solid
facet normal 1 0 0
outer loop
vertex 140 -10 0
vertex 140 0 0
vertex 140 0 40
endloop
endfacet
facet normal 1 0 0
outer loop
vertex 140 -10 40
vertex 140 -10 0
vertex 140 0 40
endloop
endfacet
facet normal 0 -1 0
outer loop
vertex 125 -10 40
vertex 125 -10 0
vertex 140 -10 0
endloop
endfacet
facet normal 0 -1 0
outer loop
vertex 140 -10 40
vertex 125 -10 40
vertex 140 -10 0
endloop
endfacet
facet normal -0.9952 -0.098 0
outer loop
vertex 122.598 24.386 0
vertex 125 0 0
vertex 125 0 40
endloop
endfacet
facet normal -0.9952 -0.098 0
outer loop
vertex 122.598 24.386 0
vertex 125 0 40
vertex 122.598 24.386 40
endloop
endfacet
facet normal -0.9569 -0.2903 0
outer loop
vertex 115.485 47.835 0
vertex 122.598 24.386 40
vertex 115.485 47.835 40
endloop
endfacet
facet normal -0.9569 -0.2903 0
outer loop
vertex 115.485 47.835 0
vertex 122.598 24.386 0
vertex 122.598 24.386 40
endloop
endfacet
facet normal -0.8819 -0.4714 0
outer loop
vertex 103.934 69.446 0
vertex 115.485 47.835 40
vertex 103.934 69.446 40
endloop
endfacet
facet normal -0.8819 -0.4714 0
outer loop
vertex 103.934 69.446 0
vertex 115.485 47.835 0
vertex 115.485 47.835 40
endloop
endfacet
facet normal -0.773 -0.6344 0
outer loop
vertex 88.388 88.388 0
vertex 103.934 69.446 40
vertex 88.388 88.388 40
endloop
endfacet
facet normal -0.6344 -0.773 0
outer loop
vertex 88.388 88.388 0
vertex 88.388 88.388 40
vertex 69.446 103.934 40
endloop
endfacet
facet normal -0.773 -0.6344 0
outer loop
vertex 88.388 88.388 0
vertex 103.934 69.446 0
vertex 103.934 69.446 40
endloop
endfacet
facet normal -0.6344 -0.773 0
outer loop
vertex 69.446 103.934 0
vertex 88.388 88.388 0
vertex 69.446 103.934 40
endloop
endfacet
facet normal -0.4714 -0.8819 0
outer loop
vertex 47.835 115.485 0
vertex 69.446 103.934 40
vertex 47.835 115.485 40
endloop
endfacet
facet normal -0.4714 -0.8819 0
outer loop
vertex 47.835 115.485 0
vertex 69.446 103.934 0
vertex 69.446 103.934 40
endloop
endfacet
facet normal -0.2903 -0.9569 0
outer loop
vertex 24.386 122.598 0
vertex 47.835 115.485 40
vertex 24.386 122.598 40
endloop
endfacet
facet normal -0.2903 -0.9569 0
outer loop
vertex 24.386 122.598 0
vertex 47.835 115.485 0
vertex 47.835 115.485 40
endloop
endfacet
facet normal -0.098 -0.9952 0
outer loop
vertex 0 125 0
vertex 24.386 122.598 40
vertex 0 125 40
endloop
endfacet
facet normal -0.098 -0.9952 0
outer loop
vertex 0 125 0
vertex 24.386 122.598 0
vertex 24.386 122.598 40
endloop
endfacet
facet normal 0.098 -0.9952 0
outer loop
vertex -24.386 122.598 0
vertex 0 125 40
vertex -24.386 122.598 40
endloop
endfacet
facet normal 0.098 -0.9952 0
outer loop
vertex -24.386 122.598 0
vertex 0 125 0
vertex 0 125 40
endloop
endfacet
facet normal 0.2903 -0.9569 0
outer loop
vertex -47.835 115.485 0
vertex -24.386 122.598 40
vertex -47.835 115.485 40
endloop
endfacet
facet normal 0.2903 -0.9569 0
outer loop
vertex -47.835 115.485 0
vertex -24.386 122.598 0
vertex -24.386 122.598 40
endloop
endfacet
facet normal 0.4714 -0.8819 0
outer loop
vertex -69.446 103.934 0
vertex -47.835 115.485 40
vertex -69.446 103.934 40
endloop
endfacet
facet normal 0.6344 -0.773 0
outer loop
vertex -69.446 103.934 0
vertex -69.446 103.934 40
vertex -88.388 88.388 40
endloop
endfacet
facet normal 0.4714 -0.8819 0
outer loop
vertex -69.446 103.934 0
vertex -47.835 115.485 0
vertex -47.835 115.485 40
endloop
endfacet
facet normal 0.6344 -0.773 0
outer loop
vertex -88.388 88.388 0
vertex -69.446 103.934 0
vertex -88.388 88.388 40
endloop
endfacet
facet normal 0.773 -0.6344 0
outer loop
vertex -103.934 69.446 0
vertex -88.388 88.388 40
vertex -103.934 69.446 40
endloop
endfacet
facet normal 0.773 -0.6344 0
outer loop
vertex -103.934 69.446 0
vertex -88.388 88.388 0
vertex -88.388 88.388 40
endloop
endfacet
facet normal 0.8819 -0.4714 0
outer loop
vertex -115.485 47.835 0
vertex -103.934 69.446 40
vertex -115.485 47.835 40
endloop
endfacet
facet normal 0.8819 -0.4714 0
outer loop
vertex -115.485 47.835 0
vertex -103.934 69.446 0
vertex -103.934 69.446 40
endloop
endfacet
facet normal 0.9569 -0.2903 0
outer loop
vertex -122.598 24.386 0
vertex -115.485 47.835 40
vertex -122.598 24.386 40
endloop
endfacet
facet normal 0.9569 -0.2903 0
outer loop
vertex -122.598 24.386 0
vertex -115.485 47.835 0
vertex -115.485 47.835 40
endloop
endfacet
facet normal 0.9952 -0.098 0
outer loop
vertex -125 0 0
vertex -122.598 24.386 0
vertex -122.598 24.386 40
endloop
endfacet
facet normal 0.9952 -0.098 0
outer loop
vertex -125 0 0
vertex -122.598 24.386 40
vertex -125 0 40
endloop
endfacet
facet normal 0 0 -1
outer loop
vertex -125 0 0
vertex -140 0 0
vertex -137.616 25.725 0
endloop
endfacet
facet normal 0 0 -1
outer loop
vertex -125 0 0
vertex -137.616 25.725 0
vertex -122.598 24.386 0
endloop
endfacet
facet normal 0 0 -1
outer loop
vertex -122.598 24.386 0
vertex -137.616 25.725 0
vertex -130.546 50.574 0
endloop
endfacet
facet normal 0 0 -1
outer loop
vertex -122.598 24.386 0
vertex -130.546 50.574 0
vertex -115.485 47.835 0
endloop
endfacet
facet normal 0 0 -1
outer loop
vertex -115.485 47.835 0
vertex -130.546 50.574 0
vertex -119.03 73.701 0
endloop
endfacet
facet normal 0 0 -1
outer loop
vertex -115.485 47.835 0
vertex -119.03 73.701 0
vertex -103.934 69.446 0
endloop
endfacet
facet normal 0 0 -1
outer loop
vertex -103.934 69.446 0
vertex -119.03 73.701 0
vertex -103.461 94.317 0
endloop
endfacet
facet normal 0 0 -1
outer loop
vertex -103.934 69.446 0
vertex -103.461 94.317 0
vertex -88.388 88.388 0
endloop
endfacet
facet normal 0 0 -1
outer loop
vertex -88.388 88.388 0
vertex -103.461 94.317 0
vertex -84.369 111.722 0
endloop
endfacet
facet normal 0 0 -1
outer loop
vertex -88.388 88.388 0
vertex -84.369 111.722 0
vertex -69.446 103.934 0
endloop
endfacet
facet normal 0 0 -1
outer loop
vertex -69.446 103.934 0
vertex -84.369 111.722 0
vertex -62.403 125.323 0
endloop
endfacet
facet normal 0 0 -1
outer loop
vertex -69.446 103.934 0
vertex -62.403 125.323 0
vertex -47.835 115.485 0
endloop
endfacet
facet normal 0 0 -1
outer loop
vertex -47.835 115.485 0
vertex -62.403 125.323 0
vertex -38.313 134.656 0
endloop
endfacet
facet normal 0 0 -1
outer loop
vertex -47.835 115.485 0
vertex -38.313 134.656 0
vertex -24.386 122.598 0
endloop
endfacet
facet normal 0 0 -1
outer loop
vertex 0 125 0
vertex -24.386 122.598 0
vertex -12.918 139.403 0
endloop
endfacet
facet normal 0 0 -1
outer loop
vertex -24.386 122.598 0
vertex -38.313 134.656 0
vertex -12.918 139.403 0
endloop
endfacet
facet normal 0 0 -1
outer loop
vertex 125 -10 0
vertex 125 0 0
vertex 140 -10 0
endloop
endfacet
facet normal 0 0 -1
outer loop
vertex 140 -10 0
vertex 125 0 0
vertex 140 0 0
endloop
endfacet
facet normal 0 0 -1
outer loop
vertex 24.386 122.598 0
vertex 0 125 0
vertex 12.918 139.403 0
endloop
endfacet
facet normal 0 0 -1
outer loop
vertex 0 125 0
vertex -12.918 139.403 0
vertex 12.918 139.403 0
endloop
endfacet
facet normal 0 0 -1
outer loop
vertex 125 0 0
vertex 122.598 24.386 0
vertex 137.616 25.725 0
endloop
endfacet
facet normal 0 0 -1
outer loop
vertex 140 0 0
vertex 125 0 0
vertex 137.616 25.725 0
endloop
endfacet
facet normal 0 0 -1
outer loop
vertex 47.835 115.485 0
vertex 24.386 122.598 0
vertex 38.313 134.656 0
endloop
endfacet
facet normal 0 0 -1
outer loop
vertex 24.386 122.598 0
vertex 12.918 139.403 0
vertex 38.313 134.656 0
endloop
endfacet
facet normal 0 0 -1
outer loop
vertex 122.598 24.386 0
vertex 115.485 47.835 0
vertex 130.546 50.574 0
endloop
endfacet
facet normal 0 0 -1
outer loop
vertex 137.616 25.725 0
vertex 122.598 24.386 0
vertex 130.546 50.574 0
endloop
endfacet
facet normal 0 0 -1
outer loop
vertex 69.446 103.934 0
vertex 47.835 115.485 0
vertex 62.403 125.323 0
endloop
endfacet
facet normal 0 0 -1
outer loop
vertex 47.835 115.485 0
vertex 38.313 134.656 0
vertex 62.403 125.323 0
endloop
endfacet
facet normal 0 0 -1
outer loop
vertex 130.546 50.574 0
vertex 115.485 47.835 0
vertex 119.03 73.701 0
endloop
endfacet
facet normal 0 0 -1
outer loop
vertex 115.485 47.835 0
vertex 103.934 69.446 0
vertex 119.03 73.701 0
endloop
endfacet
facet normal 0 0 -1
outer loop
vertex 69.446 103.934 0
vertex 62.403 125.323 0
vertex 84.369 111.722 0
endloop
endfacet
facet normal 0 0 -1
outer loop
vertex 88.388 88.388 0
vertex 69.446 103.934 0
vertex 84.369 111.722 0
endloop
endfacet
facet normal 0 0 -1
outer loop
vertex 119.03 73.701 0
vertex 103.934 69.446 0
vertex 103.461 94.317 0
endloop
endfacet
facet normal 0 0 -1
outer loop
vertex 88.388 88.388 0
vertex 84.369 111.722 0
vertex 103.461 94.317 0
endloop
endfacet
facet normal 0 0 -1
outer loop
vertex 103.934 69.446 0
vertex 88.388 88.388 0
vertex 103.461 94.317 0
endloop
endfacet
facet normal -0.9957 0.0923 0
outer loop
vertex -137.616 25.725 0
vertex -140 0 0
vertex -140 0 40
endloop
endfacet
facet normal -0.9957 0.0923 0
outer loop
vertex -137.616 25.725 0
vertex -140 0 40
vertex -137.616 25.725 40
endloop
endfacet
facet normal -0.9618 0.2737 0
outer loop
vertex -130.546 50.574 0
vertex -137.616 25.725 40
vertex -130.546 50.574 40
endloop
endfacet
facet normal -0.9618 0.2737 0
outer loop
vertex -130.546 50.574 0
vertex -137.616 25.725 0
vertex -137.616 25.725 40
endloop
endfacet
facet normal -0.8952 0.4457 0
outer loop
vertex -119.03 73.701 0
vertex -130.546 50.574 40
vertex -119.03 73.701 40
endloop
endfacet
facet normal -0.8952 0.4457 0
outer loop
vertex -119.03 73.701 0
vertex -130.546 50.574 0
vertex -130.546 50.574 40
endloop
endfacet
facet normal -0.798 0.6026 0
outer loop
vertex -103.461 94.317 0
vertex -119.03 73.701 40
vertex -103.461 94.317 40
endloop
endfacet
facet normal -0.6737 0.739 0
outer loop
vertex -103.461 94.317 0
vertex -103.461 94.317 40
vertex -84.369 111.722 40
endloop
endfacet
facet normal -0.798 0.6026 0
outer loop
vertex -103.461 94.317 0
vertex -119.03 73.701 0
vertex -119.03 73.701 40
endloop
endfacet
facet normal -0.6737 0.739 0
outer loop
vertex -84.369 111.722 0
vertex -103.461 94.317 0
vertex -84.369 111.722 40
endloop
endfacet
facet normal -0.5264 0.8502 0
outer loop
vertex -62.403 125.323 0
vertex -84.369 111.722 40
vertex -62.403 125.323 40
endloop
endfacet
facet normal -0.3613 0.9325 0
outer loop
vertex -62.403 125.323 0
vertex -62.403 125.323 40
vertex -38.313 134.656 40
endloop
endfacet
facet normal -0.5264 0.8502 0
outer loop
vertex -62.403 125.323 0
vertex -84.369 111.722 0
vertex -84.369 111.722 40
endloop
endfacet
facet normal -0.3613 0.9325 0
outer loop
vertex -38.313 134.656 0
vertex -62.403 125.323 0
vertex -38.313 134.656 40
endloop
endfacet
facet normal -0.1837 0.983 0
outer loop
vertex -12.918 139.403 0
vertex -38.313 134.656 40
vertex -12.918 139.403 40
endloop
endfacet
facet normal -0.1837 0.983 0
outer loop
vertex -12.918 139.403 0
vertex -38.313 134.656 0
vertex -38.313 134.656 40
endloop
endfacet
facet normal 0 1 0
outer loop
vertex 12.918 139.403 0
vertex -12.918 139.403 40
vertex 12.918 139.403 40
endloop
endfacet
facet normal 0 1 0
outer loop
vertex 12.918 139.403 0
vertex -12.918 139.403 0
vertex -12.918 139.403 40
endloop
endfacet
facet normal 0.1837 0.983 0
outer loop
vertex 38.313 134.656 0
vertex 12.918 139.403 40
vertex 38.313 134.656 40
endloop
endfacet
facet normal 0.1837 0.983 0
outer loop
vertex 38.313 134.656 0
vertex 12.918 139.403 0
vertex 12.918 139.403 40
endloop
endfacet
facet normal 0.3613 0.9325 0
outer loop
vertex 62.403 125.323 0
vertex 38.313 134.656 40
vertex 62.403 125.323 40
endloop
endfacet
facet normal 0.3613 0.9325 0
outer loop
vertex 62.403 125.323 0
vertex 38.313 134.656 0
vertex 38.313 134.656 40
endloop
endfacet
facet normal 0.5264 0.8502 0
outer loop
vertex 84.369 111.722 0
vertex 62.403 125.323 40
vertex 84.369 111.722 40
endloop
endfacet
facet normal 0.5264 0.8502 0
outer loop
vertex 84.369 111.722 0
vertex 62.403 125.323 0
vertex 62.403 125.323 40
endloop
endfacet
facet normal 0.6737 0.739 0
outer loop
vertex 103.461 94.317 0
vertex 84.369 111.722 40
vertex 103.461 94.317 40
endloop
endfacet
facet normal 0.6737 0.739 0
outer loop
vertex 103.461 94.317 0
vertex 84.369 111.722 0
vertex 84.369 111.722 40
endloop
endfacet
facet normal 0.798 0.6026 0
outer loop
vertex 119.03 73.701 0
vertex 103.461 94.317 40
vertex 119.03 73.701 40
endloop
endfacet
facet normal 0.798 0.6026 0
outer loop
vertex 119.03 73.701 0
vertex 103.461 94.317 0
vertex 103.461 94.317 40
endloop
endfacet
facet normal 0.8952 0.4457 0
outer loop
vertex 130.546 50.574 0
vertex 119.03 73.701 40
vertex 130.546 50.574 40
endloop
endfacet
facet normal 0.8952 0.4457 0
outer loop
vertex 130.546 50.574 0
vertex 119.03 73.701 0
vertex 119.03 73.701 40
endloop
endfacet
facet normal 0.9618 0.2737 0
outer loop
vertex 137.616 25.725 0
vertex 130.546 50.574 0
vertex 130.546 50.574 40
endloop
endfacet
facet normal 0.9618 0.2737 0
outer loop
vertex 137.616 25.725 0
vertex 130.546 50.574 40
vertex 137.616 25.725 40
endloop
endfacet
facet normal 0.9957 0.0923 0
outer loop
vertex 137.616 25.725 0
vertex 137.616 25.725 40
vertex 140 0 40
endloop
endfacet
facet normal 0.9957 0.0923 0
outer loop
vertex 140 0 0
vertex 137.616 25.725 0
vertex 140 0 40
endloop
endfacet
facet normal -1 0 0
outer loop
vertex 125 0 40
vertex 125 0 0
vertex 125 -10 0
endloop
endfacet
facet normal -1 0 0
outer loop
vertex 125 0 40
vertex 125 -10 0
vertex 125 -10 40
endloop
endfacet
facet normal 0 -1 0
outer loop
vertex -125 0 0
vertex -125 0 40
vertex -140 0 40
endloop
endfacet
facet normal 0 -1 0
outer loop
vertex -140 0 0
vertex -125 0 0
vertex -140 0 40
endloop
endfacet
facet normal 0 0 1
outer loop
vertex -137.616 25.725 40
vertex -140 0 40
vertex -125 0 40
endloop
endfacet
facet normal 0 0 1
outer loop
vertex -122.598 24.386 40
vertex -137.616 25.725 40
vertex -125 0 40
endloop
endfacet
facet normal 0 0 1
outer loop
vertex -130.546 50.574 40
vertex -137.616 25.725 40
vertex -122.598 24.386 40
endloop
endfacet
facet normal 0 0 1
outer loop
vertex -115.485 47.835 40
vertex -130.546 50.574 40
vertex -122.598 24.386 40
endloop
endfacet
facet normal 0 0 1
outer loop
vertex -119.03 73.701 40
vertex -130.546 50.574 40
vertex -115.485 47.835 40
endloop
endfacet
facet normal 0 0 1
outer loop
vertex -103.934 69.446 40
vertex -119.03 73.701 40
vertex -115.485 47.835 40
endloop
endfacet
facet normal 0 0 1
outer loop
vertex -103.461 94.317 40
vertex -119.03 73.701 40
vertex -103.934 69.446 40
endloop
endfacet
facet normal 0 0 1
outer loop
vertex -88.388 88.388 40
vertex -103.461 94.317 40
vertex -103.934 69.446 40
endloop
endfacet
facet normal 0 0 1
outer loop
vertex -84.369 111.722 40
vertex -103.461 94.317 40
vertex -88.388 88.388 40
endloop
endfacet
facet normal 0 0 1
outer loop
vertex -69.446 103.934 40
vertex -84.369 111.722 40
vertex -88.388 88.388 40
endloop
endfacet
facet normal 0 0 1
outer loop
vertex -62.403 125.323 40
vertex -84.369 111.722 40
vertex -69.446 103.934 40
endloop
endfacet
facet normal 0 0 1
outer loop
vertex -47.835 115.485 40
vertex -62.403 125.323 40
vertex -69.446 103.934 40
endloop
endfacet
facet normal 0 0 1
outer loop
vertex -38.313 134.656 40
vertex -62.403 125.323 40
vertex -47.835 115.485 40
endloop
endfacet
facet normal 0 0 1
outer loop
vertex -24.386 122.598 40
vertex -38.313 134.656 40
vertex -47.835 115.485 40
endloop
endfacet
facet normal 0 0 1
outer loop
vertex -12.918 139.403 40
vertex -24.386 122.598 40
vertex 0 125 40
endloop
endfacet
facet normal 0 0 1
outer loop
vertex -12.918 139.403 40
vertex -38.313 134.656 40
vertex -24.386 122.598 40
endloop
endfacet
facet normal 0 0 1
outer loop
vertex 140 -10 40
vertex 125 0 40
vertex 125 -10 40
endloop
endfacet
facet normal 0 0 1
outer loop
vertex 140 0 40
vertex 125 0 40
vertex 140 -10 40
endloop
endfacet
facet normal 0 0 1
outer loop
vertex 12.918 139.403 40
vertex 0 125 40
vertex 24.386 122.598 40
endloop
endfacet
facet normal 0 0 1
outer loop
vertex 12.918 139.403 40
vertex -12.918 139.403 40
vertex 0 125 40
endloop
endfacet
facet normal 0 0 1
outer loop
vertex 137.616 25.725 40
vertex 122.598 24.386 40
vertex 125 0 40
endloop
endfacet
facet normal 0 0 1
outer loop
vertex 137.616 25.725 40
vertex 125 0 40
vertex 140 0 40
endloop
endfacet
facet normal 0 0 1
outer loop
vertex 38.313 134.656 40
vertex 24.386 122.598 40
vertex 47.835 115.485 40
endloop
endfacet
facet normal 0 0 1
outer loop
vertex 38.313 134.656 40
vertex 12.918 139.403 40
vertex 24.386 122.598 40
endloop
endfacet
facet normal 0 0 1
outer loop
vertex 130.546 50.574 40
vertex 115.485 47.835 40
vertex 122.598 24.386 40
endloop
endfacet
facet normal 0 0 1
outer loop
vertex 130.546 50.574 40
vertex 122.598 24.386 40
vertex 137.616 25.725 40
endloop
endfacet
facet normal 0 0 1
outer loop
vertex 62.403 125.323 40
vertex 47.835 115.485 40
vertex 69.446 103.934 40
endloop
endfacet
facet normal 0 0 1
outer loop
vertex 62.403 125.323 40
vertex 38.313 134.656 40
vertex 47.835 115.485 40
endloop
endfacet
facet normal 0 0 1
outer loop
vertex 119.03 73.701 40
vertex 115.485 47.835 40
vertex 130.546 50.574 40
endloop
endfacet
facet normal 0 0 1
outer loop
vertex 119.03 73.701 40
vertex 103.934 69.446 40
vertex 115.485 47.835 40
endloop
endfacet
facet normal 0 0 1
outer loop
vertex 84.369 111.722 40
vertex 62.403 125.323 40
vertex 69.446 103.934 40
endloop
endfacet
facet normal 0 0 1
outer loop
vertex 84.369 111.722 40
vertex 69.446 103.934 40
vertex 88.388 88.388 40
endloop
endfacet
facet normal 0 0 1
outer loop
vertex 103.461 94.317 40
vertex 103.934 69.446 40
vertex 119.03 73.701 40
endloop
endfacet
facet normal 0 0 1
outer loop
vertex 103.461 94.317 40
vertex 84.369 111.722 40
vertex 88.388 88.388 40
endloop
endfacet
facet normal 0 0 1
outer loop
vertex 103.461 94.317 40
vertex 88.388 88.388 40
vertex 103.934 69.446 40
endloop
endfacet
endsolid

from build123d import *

# Parameters (mm, degrees)
EXTRUDE_1_DEPTH = 40
SKETCH_3_W      = 15
SKETCH_3_H      = 40
EXTRUDE_3_DEPTH = 10


with BuildPart() as part:
    # 草图1 → 凸台-拉伸1 (new body)
    with BuildSketch(Plane.XY):
        with BuildLine():
            Line((-125, 0), (-140, 0))
            ThreePointArc((-140, 0), (0, 140), (140, 0))
            Line((140, 0), (125, 0))
            ThreePointArc((125, 0), (0, 125), (-125, 0))
        make_face()
    extrude(amount=EXTRUDE_1_DEPTH)

    # 草图3 → 凸台-拉伸3 (add)
    with BuildSketch(Plane.XZ):
        with Locations((132.5, 20)):
            Rectangle(SKETCH_3_W, SKETCH_3_H)
    extrude(amount=EXTRUDE_3_DEPTH)


solid = part.part
